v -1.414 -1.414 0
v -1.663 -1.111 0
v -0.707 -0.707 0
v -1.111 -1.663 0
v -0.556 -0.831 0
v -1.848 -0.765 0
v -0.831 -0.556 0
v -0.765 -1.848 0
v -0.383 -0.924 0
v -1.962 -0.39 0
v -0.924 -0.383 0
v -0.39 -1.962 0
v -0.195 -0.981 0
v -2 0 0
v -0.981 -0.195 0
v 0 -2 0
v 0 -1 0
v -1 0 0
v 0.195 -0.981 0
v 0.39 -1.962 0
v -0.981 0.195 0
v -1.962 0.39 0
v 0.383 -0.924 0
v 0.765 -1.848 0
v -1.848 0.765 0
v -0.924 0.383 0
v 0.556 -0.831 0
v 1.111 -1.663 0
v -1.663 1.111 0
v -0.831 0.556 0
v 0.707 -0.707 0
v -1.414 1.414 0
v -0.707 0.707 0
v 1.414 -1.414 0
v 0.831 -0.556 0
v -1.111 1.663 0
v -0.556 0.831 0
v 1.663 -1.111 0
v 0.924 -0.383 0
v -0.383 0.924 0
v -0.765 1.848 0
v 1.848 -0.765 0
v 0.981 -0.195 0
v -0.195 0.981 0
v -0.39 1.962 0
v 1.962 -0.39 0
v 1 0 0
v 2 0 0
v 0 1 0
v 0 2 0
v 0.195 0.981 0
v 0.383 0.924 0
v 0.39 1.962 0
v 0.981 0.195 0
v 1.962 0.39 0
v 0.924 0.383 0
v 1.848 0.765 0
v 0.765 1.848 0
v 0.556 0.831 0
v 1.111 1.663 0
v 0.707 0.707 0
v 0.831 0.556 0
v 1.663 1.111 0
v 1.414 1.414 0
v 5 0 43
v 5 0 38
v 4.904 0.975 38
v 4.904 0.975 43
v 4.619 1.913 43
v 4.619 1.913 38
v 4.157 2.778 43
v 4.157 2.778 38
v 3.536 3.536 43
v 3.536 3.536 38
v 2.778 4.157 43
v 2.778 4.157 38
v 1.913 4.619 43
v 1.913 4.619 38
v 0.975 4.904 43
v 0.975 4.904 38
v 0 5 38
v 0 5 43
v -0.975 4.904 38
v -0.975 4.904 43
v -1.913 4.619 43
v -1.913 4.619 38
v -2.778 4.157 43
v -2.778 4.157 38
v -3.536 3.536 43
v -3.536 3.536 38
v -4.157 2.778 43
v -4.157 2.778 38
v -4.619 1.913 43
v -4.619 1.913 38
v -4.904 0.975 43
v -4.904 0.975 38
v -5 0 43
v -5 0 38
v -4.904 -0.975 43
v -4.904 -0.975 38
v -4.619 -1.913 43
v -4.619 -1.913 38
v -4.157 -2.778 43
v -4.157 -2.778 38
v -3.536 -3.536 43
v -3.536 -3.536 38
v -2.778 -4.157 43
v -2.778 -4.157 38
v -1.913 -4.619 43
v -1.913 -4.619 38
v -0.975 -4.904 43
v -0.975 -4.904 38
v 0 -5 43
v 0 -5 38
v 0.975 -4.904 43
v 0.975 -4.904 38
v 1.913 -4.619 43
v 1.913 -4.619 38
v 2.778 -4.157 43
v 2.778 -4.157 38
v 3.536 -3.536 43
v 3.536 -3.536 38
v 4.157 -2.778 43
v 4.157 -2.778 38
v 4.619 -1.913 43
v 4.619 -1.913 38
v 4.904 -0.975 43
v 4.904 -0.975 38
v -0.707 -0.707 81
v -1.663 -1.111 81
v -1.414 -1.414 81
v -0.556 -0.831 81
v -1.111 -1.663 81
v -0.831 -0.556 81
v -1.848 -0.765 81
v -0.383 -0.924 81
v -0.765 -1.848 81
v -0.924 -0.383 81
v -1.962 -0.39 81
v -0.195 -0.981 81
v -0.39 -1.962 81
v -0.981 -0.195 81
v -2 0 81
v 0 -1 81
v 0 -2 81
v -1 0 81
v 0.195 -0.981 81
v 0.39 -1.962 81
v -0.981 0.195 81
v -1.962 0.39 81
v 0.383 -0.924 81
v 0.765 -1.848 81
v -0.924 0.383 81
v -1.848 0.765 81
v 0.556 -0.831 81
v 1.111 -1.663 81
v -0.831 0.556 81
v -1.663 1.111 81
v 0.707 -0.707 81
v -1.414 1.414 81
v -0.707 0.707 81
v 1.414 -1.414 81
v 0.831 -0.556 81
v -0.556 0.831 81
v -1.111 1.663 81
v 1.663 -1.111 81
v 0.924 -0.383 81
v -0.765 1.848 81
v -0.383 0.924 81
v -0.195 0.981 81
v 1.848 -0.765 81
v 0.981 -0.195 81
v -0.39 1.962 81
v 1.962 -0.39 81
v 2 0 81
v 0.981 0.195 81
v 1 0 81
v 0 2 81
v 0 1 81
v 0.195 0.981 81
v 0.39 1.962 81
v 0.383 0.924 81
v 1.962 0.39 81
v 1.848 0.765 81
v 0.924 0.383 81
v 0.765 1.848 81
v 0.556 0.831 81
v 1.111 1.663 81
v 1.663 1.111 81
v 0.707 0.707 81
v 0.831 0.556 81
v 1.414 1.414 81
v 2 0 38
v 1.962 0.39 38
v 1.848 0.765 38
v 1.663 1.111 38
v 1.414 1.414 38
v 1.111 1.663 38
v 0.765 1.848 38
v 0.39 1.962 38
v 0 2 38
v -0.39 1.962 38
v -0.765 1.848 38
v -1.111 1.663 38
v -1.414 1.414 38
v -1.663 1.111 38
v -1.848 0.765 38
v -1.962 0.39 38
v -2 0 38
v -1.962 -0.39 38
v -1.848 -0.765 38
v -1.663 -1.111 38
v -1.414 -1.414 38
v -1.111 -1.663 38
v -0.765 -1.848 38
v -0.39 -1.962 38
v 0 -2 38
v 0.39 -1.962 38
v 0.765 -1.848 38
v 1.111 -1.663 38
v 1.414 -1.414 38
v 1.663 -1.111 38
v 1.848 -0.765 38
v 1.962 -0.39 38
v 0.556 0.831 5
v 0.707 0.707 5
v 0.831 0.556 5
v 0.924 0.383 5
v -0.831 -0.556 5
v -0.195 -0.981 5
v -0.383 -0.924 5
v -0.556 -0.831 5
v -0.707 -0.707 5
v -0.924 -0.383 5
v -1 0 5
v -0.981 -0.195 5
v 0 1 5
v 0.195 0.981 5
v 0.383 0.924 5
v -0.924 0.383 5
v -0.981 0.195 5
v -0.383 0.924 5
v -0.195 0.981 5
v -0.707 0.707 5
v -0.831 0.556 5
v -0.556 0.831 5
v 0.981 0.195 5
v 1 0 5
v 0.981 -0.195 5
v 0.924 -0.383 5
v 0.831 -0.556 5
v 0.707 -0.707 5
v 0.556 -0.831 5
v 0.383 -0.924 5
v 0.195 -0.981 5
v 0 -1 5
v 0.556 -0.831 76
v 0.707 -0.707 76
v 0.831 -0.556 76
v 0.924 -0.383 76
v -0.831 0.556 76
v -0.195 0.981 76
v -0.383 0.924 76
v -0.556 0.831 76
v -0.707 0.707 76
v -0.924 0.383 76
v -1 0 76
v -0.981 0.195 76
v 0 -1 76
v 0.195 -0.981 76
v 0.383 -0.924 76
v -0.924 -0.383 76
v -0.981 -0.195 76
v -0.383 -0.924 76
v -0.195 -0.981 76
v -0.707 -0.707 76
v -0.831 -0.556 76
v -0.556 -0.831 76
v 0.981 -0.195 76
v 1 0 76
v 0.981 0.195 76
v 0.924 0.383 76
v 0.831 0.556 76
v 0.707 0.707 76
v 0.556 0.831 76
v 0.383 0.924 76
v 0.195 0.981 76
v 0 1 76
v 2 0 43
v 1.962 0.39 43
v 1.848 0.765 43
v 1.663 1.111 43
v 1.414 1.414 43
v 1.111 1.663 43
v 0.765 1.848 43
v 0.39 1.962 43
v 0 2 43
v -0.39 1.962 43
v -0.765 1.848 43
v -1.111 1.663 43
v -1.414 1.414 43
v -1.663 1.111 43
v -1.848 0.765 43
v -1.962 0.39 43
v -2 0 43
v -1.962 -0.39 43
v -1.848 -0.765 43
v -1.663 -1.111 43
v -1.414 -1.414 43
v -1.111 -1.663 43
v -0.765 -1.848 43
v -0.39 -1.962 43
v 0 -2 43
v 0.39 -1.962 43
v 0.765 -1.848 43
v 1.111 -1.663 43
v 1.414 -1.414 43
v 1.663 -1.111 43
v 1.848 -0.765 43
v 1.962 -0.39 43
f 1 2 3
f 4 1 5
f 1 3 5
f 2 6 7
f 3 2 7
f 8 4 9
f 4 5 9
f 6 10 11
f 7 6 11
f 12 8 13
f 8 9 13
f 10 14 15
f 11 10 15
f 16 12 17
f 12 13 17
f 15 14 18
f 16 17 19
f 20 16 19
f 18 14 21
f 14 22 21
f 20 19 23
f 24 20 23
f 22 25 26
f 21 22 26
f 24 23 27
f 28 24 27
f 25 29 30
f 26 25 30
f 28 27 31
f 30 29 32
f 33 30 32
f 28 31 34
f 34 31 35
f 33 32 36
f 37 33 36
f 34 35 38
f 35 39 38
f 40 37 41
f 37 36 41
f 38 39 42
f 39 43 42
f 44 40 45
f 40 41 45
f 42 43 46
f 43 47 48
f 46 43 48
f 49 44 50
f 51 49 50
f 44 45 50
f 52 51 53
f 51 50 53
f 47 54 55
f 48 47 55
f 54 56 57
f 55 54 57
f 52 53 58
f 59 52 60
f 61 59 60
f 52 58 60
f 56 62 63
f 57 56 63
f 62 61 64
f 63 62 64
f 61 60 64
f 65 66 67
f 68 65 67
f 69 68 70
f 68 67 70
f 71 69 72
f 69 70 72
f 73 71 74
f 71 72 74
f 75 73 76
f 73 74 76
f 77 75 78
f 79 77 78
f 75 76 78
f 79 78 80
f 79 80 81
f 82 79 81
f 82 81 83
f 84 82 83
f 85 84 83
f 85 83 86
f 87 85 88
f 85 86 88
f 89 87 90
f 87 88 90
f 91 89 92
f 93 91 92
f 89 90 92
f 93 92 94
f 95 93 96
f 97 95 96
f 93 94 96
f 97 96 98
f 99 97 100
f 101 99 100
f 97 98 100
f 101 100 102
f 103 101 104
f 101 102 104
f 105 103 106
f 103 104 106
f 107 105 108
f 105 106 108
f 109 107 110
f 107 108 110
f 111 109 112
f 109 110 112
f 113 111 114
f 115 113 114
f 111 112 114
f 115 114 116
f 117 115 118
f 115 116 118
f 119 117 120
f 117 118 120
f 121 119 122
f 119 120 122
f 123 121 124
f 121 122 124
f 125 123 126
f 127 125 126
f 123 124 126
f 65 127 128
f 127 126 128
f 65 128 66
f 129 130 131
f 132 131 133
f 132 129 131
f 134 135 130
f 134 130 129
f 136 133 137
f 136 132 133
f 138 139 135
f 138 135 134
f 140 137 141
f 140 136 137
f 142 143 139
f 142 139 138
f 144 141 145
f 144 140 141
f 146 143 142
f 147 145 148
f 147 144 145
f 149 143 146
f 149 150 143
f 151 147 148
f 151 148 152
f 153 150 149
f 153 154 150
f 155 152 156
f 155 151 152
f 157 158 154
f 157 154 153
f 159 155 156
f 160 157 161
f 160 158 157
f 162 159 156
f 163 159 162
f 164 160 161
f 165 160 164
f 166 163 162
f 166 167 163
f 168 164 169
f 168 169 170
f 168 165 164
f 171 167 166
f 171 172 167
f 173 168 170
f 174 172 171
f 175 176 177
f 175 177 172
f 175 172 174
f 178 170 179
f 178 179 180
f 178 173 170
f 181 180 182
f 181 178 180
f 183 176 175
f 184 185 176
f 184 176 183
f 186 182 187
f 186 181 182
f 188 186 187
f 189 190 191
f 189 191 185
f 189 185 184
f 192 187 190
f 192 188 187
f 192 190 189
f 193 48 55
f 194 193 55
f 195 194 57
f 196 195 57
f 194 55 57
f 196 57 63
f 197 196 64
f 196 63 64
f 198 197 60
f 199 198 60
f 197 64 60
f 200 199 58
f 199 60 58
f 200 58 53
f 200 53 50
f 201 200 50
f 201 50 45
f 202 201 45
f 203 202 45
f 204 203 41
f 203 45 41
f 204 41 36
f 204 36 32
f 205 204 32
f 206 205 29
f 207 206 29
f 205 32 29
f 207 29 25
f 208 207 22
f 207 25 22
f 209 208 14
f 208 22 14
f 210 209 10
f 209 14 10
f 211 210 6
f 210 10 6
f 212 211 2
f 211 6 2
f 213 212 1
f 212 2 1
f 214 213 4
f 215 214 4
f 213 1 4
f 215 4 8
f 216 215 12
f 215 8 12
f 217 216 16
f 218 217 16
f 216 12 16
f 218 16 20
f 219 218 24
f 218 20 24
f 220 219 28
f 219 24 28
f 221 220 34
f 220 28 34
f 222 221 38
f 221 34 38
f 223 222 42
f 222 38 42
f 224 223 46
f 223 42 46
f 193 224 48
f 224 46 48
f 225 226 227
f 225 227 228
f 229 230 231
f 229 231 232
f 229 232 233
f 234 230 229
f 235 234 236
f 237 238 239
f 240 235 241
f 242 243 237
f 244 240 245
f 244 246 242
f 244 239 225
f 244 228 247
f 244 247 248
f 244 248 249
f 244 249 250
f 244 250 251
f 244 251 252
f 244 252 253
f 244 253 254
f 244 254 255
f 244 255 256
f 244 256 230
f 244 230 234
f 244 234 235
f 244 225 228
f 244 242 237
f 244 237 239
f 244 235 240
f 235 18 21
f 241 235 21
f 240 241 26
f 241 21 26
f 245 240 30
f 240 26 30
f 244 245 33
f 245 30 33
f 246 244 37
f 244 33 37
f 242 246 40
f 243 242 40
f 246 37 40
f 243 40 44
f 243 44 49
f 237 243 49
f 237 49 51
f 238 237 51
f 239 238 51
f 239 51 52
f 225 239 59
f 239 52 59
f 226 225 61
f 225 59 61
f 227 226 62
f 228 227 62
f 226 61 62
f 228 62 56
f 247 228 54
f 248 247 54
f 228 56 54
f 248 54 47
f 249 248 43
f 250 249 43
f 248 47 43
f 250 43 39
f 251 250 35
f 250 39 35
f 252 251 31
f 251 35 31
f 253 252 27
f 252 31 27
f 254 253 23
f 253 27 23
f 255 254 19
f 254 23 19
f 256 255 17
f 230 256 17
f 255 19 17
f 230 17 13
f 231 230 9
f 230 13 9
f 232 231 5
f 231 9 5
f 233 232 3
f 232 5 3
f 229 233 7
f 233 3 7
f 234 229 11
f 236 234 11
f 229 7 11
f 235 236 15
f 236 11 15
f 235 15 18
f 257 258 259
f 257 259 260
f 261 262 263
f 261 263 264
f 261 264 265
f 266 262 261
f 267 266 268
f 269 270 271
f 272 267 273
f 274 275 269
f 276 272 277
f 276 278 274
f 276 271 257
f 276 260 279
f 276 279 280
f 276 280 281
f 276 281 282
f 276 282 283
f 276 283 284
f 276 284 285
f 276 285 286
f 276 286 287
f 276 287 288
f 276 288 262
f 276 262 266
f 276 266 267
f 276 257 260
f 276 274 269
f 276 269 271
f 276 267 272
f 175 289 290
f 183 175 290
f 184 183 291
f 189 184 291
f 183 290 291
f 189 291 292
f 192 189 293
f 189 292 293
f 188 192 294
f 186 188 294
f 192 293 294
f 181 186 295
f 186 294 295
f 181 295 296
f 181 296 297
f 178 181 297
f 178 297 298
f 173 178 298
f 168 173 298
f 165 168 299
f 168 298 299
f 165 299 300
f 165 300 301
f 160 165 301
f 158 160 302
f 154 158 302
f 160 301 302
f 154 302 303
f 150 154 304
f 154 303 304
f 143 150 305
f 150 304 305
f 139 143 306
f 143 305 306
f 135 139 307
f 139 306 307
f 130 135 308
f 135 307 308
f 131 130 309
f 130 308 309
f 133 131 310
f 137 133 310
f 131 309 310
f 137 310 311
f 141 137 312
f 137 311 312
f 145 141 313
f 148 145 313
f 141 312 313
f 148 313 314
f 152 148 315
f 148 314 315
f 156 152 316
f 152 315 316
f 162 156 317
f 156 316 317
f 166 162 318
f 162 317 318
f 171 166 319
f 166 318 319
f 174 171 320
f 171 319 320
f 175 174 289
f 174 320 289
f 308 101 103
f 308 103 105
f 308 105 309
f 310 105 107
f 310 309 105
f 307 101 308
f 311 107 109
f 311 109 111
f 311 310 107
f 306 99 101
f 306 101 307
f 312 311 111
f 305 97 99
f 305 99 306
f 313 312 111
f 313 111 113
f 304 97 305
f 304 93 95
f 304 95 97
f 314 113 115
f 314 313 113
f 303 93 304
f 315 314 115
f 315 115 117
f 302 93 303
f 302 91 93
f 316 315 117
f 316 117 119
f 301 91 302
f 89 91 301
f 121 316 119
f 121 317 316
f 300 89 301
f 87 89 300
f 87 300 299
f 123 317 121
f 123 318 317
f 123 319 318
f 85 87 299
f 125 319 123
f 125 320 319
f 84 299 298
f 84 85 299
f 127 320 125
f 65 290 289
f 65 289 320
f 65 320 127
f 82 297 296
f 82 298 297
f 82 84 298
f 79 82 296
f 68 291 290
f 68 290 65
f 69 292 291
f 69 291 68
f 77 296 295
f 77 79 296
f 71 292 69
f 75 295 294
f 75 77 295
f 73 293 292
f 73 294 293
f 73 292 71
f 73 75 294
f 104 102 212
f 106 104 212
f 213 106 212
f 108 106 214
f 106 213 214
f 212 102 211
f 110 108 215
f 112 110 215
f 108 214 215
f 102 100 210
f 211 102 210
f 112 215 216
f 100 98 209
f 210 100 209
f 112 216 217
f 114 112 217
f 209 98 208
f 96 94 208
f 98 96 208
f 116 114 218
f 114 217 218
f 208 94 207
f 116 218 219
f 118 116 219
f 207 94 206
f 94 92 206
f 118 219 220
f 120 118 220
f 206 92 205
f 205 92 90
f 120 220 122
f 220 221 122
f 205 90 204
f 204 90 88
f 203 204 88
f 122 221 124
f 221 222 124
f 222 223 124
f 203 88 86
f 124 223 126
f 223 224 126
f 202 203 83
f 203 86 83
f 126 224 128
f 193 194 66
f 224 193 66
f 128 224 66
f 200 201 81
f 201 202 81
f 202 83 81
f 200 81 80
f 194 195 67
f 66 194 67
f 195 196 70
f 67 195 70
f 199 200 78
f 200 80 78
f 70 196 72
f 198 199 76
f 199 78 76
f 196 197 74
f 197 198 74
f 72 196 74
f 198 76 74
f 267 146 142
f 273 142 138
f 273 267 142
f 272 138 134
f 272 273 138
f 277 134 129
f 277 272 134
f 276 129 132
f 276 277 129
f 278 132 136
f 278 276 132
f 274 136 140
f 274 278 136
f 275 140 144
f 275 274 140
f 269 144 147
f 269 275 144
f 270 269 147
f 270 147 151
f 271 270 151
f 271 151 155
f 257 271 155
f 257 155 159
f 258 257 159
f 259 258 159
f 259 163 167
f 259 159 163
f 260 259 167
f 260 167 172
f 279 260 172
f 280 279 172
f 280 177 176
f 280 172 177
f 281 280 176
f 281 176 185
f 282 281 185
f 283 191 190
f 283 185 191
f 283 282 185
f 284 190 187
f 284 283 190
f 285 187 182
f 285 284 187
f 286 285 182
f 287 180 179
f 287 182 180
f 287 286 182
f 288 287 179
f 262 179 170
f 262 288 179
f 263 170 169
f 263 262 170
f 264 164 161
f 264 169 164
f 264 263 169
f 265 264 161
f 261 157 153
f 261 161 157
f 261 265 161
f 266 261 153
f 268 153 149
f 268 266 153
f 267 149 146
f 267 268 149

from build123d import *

# Parameters (mm, degrees)
SKETCH1_R               = 2
BOSS_EXTRUDE1_DEPTH     = 38
SKETCH2_R               = 5
BOSS_EXTRUDE2_DEPTH     = 5
SKETCH3_R               = 2
BOSS_EXTRUDE3_DEPTH     = 38
SKETCH4_R               = 1
CUT_EXTRUDE1_DEPTH      = 5
CUT_EXTRUDE2_DEPTH      = 82.308056181
CUT_EXTRUDE2_DEPTH_BACK = 5
SKETCH5_R               = 1


with BuildPart() as part:
    # Sketch1 → Boss-Extrude1 (new body)
    with BuildSketch(Plane.XY):
        Circle(SKETCH1_R)
    extrude(amount=BOSS_EXTRUDE1_DEPTH)

    # Sketch2 → Boss-Extrude2 (add)
    with BuildSketch(Plane.XY.offset(38)):
        Circle(SKETCH2_R)
    extrude(amount=BOSS_EXTRUDE2_DEPTH)

    # Sketch3 → Boss-Extrude3 (add)
    with BuildSketch(Plane.XY.offset(43)):
        Circle(SKETCH3_R)
    extrude(amount=BOSS_EXTRUDE3_DEPTH)

    # Sketch4 → Cut-Extrude1 (cut)
    with BuildSketch(Plane(origin=(0, 0, 0), x_dir=(-1, 0, 0), z_dir=(0, 0, -1))):
        Circle(SKETCH4_R)
    extrude(amount=-CUT_EXTRUDE1_DEPTH, mode=Mode.SUBTRACT)

    # Sketch5 → Cut-Extrude2 (cut, two sides: drawn at the far end of the back side and taken through both)
    with BuildSketch(Plane.XY.offset(81).offset(-CUT_EXTRUDE2_DEPTH_BACK)):
        with Locations(Location((0, 0, 0), (0, 0, 180))):
            Circle(SKETCH5_R)
    extrude(amount=CUT_EXTRUDE2_DEPTH + CUT_EXTRUDE2_DEPTH_BACK, mode=Mode.SUBTRACT)


solid = part.part
